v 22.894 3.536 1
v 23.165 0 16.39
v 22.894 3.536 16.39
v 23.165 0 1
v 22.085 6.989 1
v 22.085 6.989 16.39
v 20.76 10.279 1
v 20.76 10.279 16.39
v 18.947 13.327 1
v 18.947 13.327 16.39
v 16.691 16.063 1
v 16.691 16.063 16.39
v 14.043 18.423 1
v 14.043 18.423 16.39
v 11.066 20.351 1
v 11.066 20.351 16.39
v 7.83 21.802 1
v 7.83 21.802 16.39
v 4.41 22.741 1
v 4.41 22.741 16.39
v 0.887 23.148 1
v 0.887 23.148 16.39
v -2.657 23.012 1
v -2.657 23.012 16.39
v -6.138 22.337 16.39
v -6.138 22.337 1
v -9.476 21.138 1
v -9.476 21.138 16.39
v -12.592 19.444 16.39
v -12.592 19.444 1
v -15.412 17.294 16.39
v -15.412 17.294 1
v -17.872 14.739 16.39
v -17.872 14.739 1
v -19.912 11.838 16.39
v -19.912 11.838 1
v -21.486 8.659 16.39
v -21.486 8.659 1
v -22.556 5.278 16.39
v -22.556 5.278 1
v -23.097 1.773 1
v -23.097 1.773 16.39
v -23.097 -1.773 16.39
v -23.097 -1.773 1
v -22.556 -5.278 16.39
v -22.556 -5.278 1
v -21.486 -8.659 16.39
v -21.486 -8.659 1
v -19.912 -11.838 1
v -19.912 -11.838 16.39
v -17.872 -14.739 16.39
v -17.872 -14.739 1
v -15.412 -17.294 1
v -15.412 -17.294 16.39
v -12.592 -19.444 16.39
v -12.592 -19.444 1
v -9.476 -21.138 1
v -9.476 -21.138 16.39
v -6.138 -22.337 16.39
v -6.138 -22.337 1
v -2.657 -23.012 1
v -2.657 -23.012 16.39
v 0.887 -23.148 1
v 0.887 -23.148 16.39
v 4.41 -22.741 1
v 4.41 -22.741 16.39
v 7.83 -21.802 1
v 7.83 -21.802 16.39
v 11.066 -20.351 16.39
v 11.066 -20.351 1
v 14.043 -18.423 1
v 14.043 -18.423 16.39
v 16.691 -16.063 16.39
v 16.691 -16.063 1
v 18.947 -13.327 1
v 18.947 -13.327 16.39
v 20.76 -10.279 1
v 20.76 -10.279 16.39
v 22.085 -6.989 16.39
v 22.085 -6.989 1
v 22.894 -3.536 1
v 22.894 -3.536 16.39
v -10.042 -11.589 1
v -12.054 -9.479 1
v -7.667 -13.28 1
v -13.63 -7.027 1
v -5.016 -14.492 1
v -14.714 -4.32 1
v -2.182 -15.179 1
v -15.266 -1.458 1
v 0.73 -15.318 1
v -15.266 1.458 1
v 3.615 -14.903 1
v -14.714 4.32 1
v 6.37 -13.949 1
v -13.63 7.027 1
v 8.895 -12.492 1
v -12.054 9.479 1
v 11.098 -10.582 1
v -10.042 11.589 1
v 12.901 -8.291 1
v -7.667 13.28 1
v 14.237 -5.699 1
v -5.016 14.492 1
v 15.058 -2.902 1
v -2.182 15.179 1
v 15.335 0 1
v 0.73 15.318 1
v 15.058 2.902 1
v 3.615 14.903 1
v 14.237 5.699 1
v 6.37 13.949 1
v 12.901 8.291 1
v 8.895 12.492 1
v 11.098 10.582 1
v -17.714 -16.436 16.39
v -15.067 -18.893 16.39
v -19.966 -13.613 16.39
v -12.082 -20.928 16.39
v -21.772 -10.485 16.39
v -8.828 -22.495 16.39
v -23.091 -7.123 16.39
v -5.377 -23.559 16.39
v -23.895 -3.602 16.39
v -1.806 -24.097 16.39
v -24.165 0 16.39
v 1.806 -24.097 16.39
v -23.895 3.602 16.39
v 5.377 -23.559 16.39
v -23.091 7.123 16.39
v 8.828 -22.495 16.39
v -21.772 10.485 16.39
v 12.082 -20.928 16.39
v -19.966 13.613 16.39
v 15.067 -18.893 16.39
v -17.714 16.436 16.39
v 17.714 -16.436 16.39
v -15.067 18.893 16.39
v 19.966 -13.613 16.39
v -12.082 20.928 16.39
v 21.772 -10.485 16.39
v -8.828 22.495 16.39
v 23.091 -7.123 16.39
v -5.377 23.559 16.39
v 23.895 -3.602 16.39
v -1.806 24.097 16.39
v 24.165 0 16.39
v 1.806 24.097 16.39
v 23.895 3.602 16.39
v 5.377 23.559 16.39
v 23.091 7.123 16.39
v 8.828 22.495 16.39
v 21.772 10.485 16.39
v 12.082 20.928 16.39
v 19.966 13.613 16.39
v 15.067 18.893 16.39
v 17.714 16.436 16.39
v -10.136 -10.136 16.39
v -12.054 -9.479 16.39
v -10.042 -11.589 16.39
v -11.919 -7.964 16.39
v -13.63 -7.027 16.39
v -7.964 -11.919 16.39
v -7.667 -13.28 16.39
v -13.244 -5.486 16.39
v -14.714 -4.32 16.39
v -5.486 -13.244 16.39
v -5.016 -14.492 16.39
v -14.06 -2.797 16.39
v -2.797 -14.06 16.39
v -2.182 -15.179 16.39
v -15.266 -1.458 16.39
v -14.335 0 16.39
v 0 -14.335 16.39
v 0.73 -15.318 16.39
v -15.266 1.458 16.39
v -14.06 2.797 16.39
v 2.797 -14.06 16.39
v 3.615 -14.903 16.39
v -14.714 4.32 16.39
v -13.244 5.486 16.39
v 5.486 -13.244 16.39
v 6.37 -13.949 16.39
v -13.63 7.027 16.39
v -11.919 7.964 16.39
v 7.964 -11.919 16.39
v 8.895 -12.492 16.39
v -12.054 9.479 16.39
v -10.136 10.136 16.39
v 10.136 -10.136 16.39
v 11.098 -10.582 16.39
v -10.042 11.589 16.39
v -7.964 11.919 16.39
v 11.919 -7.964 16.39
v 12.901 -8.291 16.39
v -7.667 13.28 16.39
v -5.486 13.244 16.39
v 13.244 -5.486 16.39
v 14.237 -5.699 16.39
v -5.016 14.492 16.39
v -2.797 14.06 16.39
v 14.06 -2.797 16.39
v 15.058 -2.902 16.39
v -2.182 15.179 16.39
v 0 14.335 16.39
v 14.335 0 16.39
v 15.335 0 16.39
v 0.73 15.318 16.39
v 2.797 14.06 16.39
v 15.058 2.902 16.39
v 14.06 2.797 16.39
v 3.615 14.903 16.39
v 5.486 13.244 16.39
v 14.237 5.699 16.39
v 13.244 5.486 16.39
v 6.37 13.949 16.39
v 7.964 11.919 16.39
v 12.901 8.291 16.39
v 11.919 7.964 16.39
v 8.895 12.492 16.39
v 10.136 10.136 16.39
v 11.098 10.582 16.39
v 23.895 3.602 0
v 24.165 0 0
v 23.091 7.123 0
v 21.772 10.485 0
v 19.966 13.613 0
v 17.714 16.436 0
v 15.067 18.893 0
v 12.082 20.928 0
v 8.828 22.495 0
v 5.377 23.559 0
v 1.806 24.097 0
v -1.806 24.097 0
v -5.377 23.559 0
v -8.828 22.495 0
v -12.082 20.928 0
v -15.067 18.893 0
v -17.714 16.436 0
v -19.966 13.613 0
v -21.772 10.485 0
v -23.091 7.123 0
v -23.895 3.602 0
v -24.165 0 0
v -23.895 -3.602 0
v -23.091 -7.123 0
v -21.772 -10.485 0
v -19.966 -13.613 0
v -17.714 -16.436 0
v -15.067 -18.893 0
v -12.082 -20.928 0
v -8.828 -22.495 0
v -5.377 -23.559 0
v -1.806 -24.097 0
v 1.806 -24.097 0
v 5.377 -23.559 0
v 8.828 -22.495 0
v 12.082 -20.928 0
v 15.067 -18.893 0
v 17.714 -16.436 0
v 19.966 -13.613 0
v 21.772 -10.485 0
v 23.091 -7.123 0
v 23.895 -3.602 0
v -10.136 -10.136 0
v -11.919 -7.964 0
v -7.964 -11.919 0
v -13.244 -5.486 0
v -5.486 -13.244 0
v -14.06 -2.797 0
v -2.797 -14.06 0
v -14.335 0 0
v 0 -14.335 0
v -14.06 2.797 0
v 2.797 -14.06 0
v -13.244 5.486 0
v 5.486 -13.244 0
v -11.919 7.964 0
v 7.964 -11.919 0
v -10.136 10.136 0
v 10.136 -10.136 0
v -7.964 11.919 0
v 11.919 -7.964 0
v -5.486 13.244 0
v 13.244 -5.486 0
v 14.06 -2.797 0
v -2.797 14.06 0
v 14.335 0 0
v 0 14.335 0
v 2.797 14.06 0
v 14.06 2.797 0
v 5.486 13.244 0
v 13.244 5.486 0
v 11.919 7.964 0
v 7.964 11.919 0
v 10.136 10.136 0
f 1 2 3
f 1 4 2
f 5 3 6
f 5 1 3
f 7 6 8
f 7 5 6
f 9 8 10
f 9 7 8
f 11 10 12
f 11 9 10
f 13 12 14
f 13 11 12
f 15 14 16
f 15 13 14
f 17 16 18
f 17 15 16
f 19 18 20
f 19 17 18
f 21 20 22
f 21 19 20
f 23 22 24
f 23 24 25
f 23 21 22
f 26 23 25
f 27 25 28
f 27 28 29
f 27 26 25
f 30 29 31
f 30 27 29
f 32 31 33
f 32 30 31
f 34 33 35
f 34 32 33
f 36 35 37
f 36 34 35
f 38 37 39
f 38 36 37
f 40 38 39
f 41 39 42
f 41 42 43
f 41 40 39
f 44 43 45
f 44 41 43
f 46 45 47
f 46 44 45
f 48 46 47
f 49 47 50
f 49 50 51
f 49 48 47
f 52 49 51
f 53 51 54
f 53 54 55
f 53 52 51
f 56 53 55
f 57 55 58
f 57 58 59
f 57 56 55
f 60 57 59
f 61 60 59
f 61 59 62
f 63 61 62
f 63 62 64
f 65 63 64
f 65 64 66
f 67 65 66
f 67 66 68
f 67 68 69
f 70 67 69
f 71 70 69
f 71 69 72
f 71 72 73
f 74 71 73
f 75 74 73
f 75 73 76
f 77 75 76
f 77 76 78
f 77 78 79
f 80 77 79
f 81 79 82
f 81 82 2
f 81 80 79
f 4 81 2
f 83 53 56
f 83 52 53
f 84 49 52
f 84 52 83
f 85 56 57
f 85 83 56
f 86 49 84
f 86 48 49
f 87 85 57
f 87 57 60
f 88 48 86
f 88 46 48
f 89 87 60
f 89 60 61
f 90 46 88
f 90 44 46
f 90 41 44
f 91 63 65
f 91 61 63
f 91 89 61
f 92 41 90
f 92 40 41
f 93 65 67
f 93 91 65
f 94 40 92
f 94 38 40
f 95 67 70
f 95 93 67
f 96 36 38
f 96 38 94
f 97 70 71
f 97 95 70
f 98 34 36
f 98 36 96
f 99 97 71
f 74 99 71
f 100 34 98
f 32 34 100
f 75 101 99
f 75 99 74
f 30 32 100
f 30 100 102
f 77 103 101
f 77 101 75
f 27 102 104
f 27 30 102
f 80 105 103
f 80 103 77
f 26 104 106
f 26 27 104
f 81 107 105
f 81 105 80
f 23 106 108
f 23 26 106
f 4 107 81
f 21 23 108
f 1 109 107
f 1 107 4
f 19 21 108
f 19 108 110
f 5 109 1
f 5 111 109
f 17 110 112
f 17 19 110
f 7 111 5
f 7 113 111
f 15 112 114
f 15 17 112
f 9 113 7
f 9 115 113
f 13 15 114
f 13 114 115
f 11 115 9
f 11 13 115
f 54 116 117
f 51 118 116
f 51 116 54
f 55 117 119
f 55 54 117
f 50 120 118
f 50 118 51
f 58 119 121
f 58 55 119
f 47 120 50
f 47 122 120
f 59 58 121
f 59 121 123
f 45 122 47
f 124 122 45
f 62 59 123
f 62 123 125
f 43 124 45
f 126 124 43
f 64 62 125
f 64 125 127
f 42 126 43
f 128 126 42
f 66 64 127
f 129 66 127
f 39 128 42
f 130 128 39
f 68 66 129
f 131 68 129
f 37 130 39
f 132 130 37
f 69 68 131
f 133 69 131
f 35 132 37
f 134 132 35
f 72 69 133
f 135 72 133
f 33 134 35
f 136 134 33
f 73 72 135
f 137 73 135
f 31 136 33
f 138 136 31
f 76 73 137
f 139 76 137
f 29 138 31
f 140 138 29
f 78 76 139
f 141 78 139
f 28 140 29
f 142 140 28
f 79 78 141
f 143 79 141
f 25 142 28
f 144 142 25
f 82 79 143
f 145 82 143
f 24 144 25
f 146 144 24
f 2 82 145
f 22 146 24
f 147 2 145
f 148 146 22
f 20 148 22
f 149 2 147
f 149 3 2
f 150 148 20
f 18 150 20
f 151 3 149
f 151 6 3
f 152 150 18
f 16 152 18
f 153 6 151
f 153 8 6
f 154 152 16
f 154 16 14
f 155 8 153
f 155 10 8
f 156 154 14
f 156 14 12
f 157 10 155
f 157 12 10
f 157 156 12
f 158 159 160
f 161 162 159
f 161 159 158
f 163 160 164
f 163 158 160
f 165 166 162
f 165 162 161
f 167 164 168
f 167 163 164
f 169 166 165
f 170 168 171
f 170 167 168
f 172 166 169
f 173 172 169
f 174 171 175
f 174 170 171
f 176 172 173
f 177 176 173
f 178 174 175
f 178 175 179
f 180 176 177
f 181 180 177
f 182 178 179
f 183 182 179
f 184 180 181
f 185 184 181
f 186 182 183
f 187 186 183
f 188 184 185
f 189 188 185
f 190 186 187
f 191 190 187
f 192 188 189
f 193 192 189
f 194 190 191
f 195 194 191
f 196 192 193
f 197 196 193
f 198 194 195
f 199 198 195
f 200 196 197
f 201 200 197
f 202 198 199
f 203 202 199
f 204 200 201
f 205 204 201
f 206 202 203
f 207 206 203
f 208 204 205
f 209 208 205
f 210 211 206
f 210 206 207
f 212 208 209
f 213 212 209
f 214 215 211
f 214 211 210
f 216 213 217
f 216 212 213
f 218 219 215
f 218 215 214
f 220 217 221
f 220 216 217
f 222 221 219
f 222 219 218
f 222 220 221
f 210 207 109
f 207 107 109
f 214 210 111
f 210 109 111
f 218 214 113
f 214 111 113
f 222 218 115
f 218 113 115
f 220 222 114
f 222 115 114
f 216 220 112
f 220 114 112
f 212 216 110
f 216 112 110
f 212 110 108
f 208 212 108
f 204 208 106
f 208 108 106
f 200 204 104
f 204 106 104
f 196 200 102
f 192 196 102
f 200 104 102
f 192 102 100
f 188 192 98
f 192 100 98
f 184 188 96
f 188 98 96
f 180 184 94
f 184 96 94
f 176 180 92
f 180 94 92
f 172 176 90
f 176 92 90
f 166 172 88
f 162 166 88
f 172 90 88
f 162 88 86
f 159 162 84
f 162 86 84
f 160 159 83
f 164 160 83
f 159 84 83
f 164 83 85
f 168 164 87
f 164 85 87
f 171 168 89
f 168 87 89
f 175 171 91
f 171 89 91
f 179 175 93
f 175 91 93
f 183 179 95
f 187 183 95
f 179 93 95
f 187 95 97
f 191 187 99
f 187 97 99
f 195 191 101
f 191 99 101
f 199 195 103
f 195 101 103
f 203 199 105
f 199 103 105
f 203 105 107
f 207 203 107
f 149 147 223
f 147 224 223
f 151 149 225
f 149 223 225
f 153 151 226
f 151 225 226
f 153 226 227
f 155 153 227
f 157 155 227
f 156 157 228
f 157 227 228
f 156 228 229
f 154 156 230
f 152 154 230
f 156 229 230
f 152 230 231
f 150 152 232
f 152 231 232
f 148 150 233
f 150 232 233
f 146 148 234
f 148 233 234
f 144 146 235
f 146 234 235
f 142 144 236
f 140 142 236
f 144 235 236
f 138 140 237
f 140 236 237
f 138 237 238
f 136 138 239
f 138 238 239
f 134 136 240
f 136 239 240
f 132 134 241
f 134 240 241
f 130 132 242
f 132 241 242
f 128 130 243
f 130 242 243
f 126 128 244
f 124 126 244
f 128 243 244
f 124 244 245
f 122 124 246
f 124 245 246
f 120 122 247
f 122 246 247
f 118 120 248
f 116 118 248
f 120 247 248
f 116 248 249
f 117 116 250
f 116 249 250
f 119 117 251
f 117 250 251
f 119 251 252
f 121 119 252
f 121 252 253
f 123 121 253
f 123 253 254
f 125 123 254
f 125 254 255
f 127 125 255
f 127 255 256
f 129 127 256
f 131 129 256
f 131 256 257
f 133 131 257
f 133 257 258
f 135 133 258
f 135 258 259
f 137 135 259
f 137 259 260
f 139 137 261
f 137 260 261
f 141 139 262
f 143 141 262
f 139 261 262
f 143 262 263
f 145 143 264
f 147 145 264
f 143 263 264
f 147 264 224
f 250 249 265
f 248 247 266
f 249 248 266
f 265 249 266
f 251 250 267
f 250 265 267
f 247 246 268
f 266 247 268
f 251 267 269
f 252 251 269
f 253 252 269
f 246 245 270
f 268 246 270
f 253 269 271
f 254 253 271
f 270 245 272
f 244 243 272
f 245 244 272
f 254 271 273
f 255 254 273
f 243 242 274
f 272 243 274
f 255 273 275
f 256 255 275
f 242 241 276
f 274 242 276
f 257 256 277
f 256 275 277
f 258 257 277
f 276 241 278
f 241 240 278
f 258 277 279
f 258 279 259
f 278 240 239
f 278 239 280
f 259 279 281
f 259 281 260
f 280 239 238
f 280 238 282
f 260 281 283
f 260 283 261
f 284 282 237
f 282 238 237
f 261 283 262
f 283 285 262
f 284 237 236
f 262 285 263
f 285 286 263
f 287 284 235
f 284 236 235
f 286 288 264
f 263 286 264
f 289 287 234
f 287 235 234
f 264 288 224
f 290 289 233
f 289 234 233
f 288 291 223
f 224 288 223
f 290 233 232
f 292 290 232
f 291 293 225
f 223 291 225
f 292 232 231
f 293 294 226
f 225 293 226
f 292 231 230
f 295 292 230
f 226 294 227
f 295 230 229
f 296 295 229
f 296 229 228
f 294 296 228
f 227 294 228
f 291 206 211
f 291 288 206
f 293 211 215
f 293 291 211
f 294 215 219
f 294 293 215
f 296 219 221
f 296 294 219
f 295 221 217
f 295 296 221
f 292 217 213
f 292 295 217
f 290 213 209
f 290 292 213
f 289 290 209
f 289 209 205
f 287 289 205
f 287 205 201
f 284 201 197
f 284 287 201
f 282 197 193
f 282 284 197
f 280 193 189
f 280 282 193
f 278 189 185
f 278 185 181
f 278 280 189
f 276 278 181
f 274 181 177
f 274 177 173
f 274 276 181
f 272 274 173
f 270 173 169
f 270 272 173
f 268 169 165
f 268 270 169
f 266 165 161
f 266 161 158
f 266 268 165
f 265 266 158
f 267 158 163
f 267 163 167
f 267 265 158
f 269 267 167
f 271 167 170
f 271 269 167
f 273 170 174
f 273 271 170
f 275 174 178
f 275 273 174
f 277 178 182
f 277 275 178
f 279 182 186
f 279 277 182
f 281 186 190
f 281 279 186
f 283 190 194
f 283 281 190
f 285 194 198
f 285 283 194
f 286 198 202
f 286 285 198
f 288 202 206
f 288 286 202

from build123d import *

# Parameters (mm, degrees)
F0_R     = 24.165
F0_R_2   = 14.335
F1_DEPTH = 0.1
F2_DEPTH = 16.29
F3_T     = -1


with BuildPart() as f1:
    # F0 (on Top) → F1 (new body)
    with BuildSketch(Plane.XY):
        Circle(F0_R)
        Circle(F0_R_2, mode=Mode.SUBTRACT)
    extrude(amount=F1_DEPTH)

    # F2 (add): a face of the model
    f2_faces = [f1.faces().sort_by_distance(p)[0] for p in [
        (-23.4815105853, 0, 0.1),
    ]]
    extrude(f2_faces, amount=F2_DEPTH)

    # F3
    f3_openings = [f1.faces().sort_by_distance(p)[0] for p in [
        (-23.481511, 0, 16.39),
    ]]
    offset(amount=F3_T, openings=f3_openings)


solid = f1.part
